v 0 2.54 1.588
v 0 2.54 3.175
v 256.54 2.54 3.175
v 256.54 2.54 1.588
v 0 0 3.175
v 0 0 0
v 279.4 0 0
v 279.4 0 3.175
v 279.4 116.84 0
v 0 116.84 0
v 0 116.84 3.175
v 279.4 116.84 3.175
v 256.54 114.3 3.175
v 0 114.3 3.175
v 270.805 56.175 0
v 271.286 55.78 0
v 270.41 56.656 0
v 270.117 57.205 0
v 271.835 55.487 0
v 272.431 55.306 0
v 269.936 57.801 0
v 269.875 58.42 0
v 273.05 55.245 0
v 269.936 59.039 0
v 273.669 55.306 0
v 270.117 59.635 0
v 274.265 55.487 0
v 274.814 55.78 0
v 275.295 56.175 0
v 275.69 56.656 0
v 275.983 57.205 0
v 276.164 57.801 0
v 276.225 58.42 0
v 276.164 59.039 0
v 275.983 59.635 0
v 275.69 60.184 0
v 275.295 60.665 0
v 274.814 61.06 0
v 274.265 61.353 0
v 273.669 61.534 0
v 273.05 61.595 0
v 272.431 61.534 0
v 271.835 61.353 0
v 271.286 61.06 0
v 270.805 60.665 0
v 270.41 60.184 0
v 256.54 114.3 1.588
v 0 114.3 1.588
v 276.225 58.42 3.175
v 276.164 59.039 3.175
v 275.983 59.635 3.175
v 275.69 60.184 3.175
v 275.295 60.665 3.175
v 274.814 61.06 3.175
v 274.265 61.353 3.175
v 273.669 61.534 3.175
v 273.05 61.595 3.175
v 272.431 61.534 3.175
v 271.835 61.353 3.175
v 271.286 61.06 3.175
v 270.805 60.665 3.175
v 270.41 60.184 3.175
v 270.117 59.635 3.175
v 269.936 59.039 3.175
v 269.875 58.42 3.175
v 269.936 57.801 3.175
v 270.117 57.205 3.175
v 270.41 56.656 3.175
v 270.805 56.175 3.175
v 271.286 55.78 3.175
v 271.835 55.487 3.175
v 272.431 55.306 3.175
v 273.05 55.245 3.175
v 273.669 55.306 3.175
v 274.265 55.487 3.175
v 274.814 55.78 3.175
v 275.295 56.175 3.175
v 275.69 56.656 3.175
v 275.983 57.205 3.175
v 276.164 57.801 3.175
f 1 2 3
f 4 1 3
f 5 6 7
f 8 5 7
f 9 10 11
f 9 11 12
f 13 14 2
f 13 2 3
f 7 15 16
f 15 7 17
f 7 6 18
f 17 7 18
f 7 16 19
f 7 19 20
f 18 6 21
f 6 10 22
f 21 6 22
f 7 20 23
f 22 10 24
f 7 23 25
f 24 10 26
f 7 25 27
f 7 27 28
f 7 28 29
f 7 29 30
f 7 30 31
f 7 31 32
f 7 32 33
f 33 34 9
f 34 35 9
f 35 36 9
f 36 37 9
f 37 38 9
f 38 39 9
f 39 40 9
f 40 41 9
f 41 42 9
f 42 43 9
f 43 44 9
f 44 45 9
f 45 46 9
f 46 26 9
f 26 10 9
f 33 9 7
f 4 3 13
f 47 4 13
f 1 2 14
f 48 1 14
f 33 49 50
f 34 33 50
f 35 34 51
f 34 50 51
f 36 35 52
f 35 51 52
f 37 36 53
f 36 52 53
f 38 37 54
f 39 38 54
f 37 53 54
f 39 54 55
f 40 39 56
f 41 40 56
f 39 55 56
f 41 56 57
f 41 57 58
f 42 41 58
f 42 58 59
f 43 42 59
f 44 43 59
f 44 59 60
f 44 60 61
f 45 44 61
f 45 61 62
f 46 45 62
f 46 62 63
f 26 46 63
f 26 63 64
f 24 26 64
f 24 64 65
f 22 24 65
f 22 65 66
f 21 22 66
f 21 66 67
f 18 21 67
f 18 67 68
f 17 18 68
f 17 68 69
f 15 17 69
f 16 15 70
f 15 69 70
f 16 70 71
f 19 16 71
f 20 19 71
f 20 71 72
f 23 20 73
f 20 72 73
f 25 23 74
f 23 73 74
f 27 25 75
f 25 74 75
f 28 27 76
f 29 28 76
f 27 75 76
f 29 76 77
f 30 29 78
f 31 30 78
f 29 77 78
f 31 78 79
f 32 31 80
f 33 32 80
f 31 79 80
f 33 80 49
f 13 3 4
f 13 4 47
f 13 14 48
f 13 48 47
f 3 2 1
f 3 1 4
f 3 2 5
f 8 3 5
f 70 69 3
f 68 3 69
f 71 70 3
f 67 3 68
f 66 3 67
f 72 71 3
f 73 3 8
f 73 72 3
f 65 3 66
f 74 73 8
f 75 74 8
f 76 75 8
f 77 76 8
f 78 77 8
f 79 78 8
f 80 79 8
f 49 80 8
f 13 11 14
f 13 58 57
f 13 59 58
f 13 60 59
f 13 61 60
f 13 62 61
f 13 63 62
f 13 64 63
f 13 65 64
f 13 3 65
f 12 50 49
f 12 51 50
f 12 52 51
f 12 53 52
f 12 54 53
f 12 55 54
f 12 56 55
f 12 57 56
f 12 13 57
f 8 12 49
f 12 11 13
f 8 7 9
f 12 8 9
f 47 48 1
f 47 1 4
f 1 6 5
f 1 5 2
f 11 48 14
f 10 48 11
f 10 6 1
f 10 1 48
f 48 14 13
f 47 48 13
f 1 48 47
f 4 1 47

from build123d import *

# Parameters (mm, degrees)
F0_W     = 279.4
F0_H     = 116.84
F1_DEPTH = 3.175
F2_R     = 3.175
F3_DEPTH = 3.176
F4_W     = 256.54
F4_H     = 111.76
F5_DEPTH = 1.5875
F6_DEPTH = 1.5875


with BuildPart() as f1:
    # F0 (on Top) → F1 (new body)
    with BuildSketch(Plane.XY):
        with Locations((139.7, 58.42)):
            Rectangle(F0_W, F0_H)
    extrude(amount=F1_DEPTH)

    # F2 (on face) → F3 (cut, through all)
    with BuildSketch(Plane.XY.offset(3.175)):
        with Locations((273.05, 58.42)):
            Circle(F2_R)
    extrude(amount=-F3_DEPTH, mode=Mode.SUBTRACT)

    # F4 (on face) → F5 (cut)
    with BuildSketch(Plane.XY.offset(3.175)):
        with Locations((128.27, 58.42)):
            Rectangle(F4_W, F4_H)
    extrude(amount=-F5_DEPTH, mode=Mode.SUBTRACT)


with BuildPart() as f6:
    # F4 (on face) → F6 (new body)
    with BuildSketch(Plane.XY.offset(3.175)):
        with Locations((128.27, 58.42)):
            Rectangle(F4_W, F4_H)
    extrude(amount=-F6_DEPTH)


solid = Compound([f1.part, f6.part])
